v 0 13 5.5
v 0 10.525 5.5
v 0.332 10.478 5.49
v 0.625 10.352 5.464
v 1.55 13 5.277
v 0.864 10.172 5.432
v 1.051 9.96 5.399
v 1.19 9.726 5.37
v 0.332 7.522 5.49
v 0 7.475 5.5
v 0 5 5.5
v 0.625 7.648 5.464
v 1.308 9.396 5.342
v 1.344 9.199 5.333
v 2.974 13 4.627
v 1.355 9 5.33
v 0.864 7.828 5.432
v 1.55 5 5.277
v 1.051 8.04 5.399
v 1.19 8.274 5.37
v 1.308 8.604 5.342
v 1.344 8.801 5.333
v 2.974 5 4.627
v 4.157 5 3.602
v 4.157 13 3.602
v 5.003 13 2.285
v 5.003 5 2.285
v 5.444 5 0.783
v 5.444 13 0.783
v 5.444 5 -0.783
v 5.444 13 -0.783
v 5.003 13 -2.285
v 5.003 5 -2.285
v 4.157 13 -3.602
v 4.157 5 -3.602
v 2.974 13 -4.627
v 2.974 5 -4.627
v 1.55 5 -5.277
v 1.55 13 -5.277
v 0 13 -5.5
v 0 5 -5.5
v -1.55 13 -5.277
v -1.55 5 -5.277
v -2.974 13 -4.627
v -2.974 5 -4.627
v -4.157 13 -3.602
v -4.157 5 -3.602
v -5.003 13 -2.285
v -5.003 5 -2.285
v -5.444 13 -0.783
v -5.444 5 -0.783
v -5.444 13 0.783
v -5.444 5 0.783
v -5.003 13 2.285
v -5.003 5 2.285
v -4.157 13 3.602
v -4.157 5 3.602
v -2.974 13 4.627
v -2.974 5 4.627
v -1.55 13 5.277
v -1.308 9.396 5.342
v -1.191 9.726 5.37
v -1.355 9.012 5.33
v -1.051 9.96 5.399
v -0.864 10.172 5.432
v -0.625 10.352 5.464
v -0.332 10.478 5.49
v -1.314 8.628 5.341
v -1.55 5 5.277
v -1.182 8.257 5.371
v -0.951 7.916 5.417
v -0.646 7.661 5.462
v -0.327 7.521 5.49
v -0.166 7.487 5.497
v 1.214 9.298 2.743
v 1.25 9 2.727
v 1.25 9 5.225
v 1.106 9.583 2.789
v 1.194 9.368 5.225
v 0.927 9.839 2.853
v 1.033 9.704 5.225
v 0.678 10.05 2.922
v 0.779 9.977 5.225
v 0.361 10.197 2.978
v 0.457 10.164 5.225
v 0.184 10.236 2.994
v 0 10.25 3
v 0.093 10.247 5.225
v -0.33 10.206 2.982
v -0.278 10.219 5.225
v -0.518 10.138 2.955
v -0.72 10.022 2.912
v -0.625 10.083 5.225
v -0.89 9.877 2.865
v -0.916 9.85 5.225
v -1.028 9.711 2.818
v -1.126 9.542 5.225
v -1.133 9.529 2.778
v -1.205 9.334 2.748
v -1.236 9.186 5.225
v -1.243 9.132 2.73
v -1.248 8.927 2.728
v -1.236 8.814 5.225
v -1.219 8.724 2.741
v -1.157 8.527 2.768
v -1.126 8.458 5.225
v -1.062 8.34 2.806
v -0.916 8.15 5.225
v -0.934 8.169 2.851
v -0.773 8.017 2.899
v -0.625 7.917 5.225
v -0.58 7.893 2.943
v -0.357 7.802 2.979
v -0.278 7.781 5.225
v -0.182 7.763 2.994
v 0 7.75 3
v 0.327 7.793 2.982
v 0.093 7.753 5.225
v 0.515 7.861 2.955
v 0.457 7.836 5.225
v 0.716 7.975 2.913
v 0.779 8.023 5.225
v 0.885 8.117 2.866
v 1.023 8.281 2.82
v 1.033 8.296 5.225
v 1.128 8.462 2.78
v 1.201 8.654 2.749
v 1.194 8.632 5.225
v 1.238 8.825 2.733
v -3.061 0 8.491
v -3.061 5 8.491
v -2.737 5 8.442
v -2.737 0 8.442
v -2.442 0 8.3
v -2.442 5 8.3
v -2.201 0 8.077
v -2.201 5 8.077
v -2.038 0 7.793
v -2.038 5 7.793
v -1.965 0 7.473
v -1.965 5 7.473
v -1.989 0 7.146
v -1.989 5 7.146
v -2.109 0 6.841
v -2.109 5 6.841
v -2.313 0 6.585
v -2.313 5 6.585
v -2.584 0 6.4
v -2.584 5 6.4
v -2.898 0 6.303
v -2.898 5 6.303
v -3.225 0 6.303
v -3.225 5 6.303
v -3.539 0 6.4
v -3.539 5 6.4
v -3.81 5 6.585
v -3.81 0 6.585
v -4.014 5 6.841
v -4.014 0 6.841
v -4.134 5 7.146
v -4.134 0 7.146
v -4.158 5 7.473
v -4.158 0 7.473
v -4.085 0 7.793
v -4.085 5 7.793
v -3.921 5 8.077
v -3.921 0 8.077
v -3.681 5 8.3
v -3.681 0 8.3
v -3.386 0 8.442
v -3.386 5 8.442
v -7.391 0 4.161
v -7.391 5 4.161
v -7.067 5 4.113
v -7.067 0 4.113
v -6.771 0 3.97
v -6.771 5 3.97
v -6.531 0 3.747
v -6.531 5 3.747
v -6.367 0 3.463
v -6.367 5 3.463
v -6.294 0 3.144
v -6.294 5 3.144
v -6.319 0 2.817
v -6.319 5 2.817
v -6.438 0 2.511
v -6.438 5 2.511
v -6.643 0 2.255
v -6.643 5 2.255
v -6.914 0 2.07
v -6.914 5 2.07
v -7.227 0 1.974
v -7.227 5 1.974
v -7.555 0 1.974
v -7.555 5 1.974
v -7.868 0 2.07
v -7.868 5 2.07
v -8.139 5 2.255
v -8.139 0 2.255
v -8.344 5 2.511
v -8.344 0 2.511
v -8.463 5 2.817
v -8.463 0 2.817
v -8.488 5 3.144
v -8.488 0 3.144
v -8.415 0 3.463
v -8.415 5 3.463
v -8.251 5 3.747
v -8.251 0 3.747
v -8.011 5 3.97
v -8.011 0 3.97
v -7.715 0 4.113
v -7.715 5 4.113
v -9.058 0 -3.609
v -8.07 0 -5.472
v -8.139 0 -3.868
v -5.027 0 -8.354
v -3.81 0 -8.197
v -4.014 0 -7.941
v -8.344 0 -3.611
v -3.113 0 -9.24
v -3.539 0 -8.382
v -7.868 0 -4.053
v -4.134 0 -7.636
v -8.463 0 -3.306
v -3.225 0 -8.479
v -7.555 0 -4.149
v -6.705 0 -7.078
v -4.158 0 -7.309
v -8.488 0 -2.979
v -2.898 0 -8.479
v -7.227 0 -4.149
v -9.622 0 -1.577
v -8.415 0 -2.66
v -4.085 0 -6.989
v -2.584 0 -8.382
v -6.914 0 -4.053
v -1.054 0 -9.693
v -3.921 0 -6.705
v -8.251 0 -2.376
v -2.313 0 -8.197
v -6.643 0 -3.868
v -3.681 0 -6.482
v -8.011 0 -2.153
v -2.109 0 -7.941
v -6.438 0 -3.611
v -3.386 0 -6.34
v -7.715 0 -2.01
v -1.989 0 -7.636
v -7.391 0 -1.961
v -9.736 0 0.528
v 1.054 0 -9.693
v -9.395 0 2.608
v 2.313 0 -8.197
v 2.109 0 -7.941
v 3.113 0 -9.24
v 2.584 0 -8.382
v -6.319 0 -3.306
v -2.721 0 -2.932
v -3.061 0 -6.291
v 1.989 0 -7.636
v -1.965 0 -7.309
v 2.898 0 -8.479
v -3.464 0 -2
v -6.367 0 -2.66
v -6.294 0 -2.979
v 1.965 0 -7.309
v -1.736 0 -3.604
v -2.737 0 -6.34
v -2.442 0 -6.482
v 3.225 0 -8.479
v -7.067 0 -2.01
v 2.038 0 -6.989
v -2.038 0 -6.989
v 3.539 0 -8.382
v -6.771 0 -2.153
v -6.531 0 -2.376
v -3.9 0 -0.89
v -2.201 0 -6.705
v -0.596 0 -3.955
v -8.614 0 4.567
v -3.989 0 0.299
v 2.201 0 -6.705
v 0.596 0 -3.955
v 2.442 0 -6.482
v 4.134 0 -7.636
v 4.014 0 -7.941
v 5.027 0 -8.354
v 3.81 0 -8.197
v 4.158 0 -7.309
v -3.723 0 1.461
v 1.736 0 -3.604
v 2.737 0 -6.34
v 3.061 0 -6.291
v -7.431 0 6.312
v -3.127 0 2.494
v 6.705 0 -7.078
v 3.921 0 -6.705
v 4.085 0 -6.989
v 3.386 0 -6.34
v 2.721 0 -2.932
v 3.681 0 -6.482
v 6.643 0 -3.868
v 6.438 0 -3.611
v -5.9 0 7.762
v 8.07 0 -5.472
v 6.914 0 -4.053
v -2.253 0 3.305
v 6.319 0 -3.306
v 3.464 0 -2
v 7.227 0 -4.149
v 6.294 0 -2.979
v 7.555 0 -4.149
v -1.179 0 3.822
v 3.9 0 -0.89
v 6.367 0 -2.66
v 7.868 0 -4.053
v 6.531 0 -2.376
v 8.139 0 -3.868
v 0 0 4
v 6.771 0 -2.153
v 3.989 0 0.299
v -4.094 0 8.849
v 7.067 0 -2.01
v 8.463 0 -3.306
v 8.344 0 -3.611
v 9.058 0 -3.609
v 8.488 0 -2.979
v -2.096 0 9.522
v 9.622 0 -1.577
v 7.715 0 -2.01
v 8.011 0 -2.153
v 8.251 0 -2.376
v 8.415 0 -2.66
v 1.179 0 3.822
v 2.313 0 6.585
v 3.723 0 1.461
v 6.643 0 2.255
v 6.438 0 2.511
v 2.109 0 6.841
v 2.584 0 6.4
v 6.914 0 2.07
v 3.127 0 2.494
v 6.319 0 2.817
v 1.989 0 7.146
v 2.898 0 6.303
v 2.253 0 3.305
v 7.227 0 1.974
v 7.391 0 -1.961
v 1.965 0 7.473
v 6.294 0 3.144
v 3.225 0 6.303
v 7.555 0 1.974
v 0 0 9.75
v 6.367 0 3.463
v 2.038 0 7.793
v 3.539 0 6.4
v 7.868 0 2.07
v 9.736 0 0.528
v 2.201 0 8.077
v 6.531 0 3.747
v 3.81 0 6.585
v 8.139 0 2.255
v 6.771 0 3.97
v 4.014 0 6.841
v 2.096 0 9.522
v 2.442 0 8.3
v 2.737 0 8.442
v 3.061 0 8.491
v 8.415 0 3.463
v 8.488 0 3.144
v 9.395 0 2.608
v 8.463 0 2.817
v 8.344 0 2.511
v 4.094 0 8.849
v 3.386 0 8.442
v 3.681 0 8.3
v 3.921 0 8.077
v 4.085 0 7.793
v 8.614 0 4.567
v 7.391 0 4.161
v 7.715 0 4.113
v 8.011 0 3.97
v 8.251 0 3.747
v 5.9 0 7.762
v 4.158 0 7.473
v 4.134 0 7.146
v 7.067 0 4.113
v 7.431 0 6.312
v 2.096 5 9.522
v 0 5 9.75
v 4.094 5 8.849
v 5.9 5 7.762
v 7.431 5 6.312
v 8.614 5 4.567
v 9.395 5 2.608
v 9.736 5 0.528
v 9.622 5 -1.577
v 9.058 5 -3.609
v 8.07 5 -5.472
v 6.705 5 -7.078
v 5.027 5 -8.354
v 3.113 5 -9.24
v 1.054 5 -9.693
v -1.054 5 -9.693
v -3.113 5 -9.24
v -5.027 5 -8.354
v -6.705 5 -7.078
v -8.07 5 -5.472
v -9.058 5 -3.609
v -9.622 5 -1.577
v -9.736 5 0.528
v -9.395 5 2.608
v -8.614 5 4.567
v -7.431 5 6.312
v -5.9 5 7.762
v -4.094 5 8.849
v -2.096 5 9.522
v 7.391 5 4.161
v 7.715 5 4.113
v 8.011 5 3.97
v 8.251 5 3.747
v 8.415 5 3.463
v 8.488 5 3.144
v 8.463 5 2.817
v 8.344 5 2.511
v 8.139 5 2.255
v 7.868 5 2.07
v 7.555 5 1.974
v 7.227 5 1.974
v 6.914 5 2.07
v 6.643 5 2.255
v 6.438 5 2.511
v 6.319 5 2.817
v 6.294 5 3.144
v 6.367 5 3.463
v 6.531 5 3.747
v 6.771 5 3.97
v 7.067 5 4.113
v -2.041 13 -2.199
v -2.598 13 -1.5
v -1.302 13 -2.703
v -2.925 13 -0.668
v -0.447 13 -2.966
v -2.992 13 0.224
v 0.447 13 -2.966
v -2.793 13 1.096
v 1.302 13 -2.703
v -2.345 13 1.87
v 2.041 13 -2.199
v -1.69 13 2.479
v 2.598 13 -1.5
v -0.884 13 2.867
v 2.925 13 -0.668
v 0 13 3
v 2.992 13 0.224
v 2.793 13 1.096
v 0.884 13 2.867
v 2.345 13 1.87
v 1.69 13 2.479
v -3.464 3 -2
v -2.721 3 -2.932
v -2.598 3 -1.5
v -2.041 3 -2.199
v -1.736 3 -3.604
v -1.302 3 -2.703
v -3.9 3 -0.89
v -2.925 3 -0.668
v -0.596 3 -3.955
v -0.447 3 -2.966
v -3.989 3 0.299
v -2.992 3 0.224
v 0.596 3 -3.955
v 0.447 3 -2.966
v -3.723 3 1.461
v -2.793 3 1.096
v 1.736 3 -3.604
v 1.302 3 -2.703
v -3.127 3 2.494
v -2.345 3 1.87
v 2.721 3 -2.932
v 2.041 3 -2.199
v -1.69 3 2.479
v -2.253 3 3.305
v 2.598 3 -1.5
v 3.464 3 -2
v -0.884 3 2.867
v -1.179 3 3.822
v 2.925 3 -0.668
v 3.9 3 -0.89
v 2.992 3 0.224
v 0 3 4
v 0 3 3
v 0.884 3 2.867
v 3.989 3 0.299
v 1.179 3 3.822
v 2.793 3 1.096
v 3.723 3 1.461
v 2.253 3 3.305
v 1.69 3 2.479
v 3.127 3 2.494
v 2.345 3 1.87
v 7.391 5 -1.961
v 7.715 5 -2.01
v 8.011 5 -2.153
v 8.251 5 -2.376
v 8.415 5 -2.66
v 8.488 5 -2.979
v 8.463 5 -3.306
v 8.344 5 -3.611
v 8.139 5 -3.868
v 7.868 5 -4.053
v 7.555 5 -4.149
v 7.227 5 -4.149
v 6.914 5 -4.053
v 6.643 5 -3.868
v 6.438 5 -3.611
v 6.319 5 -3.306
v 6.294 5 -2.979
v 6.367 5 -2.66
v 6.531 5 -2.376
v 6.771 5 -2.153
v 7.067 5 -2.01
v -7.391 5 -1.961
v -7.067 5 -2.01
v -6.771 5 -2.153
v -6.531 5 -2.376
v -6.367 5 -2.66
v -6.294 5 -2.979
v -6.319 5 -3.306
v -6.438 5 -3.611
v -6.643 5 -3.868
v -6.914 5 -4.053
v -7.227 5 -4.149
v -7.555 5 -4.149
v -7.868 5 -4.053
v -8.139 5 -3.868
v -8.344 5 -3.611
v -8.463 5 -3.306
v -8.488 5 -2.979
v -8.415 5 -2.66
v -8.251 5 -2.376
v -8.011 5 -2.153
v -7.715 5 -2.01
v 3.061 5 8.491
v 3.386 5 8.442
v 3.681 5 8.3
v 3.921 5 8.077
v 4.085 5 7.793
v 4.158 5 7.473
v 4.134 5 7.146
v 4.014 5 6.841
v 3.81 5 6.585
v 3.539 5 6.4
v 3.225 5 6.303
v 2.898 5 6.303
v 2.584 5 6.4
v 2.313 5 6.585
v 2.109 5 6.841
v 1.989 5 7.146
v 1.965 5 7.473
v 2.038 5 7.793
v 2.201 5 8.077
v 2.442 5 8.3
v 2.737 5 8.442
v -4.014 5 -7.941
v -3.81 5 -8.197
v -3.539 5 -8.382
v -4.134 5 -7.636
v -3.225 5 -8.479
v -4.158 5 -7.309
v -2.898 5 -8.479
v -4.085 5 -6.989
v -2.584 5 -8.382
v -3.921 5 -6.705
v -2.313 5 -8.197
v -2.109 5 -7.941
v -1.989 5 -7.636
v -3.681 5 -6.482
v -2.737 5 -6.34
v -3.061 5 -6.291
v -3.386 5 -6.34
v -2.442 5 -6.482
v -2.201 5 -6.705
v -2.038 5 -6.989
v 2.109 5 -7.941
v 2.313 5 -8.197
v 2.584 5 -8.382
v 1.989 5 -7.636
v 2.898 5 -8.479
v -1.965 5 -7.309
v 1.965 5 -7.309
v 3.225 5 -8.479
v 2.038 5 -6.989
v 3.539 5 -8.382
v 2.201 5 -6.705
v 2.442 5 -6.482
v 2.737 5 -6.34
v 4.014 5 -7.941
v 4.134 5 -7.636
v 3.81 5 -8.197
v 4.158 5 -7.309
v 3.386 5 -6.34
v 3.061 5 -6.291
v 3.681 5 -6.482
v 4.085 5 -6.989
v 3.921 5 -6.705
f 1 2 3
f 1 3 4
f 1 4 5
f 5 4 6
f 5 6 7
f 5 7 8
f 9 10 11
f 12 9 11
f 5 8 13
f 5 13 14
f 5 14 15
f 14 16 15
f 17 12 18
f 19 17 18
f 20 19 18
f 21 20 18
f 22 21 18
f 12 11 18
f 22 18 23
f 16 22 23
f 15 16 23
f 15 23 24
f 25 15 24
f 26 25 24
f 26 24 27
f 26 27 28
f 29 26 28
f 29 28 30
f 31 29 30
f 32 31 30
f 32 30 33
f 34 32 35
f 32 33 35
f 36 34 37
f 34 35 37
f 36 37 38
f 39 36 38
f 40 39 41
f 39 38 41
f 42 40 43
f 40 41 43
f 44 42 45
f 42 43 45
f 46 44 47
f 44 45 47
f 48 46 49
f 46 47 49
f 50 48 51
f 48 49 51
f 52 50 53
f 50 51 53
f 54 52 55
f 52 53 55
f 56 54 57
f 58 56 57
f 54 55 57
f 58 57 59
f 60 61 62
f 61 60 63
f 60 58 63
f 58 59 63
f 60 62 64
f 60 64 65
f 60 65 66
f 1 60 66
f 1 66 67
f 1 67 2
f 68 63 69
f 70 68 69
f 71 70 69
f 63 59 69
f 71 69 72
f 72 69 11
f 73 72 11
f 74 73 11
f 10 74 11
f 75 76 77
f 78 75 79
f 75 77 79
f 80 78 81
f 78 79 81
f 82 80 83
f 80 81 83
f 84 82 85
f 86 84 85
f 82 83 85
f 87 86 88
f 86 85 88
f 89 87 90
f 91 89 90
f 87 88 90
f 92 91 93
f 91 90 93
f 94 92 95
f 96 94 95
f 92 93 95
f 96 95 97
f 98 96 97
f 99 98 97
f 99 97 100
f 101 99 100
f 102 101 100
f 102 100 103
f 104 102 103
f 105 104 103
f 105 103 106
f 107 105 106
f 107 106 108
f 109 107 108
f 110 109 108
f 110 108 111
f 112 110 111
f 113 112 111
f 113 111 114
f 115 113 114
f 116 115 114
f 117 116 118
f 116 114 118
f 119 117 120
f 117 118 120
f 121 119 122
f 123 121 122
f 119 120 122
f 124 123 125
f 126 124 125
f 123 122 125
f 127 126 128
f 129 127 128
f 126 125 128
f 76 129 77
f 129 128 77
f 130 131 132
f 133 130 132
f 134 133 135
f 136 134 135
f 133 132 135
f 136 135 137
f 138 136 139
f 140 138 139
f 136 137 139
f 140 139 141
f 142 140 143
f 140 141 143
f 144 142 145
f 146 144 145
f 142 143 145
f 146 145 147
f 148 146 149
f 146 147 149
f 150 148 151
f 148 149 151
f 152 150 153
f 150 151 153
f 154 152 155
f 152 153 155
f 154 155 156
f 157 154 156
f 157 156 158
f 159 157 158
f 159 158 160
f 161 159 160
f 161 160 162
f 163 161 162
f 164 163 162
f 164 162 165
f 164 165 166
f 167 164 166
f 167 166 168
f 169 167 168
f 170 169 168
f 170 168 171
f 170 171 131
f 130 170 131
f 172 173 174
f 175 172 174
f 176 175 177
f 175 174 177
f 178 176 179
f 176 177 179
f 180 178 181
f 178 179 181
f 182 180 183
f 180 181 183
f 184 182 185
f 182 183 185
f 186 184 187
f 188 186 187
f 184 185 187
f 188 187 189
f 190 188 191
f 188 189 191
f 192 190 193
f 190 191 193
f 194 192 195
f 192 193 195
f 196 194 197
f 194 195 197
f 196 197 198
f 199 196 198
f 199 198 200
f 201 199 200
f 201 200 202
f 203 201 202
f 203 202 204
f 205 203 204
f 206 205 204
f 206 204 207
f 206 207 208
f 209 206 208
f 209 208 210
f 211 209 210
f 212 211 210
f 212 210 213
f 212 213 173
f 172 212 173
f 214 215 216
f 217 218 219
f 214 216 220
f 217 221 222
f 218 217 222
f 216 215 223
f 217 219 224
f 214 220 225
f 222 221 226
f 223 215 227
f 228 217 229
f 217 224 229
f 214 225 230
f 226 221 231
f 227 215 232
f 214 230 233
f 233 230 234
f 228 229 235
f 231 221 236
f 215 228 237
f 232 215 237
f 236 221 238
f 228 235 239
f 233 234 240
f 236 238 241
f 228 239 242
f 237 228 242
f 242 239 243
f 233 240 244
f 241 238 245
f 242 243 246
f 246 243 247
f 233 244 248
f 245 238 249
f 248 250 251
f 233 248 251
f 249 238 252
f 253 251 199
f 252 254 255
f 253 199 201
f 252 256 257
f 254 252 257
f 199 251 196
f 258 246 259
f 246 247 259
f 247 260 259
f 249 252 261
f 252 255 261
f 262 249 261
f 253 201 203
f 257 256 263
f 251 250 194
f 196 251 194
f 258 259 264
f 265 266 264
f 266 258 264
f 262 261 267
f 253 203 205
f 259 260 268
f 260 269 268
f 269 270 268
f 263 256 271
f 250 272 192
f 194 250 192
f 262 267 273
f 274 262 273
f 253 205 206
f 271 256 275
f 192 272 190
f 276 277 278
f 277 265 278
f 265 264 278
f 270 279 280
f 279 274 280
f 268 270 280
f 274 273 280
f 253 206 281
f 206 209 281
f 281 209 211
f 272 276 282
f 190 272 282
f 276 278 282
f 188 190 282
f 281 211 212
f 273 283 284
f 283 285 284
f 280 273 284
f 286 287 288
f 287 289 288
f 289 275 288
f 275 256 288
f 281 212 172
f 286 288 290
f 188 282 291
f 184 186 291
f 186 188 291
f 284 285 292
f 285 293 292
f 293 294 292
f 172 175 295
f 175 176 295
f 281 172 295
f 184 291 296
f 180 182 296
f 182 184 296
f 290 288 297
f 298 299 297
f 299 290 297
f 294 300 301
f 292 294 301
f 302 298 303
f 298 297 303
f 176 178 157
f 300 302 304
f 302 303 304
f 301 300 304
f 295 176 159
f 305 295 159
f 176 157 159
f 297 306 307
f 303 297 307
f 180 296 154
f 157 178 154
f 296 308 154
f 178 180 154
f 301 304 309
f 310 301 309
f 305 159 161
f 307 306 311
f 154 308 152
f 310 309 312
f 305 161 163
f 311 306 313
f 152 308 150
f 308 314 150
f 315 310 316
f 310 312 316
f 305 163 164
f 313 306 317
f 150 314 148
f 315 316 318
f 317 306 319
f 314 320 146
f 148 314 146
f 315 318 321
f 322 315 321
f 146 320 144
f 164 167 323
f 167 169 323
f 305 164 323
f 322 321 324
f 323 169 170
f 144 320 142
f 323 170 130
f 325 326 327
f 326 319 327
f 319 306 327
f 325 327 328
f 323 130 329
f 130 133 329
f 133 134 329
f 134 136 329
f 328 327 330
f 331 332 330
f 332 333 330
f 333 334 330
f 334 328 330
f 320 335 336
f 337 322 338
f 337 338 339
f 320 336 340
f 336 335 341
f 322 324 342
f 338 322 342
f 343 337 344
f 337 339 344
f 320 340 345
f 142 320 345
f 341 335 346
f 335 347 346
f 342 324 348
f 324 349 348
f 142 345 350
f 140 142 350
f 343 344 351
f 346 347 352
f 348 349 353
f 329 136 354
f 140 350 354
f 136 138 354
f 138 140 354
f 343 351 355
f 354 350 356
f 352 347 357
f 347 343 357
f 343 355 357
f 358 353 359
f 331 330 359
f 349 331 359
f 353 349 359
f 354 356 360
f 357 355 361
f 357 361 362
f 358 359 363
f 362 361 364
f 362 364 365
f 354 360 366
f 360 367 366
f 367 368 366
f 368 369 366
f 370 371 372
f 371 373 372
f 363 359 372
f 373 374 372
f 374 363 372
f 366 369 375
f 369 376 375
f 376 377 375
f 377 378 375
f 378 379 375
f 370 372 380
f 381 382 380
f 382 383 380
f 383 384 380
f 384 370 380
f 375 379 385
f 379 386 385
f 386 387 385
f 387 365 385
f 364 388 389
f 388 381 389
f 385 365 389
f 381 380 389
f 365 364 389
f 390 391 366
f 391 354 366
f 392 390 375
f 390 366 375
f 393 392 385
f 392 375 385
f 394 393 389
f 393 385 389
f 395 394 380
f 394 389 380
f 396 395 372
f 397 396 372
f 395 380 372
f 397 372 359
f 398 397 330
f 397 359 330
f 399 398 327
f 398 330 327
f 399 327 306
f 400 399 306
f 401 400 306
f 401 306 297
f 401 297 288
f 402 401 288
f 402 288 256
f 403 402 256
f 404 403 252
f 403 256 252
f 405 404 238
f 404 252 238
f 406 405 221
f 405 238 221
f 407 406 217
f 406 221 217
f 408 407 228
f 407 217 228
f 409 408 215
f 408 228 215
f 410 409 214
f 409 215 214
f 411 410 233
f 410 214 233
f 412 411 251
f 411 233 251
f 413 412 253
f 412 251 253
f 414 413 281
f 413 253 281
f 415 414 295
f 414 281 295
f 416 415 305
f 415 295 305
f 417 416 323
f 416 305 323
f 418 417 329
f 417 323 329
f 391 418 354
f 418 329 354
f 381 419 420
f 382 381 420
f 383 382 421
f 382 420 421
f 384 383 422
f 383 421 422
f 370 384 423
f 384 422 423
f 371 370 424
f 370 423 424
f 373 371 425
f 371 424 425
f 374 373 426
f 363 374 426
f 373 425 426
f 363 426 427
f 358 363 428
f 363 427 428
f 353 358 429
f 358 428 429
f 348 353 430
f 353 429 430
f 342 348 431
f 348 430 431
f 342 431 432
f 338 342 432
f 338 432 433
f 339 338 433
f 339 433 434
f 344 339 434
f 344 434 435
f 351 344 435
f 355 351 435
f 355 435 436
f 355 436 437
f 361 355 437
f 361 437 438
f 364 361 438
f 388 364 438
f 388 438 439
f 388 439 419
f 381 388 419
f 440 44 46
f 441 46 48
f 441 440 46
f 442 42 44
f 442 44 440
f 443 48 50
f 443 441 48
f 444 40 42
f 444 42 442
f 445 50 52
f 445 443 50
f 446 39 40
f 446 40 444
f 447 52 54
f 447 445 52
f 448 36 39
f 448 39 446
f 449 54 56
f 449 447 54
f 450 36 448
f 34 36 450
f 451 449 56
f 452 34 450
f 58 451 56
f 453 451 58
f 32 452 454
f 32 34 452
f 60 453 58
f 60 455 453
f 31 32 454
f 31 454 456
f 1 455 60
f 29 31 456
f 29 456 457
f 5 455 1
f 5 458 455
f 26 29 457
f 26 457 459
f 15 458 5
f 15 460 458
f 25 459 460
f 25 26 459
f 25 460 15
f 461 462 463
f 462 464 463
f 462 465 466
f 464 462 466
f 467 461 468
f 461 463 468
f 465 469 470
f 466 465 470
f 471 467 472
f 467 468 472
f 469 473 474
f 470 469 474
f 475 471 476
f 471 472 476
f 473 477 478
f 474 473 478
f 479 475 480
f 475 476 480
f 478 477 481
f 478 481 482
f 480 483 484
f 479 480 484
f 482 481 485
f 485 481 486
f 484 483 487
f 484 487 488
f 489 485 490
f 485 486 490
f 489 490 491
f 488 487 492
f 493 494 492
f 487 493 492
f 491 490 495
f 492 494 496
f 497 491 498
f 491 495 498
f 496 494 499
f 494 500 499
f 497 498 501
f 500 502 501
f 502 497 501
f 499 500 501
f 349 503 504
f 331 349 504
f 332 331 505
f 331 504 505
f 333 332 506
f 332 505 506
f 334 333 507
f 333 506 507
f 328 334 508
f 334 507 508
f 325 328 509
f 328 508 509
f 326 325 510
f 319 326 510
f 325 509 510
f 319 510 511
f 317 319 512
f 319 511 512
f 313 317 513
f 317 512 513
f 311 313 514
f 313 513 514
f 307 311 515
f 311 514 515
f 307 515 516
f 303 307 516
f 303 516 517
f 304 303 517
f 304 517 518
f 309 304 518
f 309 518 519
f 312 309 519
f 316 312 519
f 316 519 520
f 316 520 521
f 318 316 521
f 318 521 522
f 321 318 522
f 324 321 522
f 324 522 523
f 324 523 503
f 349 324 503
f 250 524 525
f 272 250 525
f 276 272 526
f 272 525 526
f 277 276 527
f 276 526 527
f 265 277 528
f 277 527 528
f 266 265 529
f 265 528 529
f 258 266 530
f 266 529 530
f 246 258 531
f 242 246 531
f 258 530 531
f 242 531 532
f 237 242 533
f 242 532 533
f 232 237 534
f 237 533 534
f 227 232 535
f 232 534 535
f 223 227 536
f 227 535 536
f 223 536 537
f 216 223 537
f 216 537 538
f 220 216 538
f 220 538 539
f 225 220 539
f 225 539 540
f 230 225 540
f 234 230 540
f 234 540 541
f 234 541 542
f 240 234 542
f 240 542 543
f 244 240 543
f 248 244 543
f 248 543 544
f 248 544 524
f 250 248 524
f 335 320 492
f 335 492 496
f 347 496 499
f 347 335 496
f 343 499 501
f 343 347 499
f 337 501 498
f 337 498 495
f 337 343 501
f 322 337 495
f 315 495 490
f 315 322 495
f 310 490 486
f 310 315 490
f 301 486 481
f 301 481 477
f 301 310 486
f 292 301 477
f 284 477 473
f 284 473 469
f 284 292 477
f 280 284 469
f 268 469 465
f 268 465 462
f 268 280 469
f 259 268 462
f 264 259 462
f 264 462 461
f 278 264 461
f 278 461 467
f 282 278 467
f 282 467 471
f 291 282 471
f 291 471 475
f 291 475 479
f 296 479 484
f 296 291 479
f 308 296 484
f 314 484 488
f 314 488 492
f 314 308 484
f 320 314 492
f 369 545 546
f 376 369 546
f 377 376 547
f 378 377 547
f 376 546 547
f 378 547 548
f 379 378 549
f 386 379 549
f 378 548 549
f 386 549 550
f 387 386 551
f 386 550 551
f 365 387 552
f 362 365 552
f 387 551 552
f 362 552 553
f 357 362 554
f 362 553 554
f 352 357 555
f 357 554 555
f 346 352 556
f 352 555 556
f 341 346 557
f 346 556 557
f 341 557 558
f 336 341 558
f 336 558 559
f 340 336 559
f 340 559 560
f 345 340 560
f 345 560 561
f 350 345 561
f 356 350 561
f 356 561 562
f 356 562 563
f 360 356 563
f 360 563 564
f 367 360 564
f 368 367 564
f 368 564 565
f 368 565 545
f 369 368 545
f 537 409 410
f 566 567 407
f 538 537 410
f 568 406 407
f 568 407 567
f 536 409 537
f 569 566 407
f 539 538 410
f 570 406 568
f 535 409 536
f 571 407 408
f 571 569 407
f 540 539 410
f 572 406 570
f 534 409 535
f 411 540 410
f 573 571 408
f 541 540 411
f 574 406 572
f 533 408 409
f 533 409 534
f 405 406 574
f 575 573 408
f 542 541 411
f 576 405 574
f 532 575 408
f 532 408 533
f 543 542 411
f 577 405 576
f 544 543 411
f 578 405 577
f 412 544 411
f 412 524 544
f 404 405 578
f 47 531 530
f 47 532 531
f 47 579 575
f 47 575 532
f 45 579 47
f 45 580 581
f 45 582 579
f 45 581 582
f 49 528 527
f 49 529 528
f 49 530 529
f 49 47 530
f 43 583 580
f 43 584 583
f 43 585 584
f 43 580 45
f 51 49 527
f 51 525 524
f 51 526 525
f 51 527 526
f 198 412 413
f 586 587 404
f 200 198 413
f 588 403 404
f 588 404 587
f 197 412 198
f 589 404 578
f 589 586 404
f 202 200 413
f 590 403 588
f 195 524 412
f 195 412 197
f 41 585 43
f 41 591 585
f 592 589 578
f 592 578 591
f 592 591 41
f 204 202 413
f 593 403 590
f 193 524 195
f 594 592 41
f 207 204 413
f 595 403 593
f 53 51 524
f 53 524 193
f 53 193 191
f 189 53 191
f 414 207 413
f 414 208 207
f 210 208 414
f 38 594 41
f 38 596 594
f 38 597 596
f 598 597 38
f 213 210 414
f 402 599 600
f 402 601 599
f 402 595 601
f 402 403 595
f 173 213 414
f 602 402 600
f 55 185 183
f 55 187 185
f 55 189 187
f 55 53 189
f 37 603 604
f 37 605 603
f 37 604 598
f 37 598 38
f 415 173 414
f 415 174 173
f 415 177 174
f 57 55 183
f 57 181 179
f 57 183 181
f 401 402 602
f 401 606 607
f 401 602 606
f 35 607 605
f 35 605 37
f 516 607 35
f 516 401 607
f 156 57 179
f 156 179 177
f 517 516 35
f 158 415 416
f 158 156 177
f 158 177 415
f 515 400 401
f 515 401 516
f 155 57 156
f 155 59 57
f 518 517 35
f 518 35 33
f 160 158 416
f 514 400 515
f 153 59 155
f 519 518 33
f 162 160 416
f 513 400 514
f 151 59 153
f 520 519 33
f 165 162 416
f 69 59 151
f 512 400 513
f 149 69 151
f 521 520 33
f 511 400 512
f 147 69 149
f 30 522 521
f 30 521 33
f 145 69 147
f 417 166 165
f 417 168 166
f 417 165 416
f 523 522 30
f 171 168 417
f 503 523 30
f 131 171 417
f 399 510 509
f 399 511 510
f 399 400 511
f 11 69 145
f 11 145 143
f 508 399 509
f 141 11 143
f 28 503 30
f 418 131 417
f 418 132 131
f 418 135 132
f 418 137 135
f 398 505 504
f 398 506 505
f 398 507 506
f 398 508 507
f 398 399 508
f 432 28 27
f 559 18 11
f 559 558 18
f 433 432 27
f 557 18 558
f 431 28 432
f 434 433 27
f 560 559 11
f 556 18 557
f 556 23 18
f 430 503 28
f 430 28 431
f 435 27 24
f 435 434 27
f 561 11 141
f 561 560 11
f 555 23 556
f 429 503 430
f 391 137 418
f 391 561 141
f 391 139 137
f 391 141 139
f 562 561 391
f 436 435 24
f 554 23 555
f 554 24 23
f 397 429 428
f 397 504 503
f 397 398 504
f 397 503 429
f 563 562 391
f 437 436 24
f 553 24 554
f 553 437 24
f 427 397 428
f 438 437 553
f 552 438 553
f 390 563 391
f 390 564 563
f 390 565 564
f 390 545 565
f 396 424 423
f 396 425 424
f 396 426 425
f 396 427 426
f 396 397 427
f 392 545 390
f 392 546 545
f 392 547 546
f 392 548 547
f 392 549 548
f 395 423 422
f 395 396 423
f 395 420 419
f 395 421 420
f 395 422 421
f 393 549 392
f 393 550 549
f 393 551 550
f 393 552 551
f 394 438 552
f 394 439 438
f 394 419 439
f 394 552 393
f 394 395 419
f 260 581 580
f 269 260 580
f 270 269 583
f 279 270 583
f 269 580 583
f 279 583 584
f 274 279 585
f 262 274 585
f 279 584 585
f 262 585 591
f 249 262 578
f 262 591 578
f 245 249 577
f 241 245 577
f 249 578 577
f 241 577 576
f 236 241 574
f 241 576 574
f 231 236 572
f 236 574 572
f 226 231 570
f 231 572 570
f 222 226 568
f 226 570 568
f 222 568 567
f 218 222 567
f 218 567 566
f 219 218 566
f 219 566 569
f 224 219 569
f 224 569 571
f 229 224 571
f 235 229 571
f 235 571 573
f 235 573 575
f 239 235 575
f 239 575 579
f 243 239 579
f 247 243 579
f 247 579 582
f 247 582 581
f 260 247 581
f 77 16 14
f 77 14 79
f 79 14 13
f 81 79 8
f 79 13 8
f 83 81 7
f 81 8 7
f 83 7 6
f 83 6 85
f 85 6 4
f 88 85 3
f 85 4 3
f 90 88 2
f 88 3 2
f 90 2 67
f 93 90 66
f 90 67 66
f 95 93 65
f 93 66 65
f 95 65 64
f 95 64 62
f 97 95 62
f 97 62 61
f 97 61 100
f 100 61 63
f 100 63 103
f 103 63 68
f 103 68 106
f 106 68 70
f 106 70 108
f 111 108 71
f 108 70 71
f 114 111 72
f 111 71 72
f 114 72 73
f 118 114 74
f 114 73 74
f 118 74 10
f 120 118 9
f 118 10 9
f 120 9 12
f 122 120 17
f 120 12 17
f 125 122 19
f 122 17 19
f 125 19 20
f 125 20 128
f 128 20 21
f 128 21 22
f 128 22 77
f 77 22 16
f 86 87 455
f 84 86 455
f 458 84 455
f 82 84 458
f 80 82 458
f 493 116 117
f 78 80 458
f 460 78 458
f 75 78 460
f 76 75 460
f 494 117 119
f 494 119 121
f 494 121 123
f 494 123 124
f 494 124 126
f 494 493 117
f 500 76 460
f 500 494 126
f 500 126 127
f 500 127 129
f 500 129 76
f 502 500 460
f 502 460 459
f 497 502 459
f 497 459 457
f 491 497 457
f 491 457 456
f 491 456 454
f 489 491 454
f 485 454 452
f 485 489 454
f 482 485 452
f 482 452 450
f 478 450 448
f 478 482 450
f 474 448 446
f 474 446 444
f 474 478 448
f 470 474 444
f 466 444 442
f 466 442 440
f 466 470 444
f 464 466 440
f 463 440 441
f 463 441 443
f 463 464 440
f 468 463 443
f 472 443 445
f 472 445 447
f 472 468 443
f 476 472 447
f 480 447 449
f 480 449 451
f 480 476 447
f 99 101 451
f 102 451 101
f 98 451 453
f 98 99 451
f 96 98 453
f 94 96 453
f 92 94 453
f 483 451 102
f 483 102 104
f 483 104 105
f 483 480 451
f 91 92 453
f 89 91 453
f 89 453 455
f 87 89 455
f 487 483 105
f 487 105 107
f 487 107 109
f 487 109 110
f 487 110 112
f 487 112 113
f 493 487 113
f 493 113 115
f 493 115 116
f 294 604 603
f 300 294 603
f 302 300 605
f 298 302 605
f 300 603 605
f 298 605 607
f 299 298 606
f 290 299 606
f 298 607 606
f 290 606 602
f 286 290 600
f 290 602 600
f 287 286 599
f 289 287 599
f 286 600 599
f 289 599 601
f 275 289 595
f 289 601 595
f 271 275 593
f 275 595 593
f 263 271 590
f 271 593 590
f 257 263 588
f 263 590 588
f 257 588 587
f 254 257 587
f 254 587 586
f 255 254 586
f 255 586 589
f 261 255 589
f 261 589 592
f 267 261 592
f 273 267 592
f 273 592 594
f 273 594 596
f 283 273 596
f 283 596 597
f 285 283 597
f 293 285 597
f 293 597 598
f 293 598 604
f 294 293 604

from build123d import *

# Parameters (mm, degrees)
SKETCH2_R           = 9.75
SKETCH2_R_2         = 4
BOSS_EXTRUDE1_DEPTH = 3
SKETCH3_R           = 5.5
SKETCH3_R_2         = 3
BOSS_EXTRUDE2_DEPTH = 10
SKETCH16_R          = 9.75
SKETCH16_R_2        = 5.5
BOSS_EXTRUDE3_DEPTH = 2
SKETCH5_R           = 1.1
CUT_EXTRUDE1_DEPTH  = 16.941298617


# Read off the part's stored shape, not the designer's step: M3x0.5 Tapped Hole1
with BuildPart() as part:
    # Sketch2 → Boss-Extrude1 (new body)
    with BuildSketch(Plane(origin=(0, 0, 0), x_dir=(1, 0, 0), z_dir=(0, 1, 0))):
        with Locations(Location((0, 0, 0), (0, 0, 270))):
            Circle(SKETCH2_R)
        with Locations(Location((0, 0, 0), (0, 0, 270))):
            Circle(SKETCH2_R_2, mode=Mode.SUBTRACT)
    extrude(amount=BOSS_EXTRUDE1_DEPTH)

    # Sketch3 → Boss-Extrude2 (add)
    with BuildSketch(Plane(origin=(0, 3, 0), x_dir=(1, 0, 0), z_dir=(0, 1, 0))):
        with Locations(Location((0, 0, 0), (0, 0, 270))):
            Circle(SKETCH3_R)
        with Locations(Location((0, 0, 0), (0, 0, 270))):
            Circle(SKETCH3_R_2, mode=Mode.SUBTRACT)
    extrude(amount=BOSS_EXTRUDE2_DEPTH)

    # Sketch16 → Boss-Extrude3 (add)
    with BuildSketch(Plane(origin=(0, 3, 0), x_dir=(1, 0, 0), z_dir=(0, 1, 0))):
        with Locations(Location((0, 0, 0), (0, 0, 270))):
            Circle(SKETCH16_R)
        with Locations(Location((0, 0, 0), (0, 0, 270))):
            Circle(SKETCH16_R_2, mode=Mode.SUBTRACT)
    extrude(amount=BOSS_EXTRUDE3_DEPTH)

    # M3x0.5 Tapped Hole1 outline → M3x0.5 Tapped Hole1 (revolve, cut)
    with BuildSketch(Plane.XZ.offset(-9)):
        Polygon((1.525000456, 5.500000456), (0, 5.500000456), (0, 2.727054604), (1.25, 2.727054604), (1.25, 5.225), align=None)
    revolve(axis=Axis((0, 9, 0), (0, 0, 1)), mode=Mode.SUBTRACT)

    # Sketch5 → Cut-Extrude1 (cut, through all)
    with BuildSketch(Plane(origin=(0, 5, 0), x_dir=(1, 0, 0), z_dir=(0, 1, 0))):
        with Locations(Location((3.061467459, 7.39103626, 0), (0, 0, 270))):
            Circle(SKETCH5_R)
        with Locations(Location((7.39103626, 3.061467459, 0), (0, 0, 270))):
            Circle(SKETCH5_R)
        with Locations(Location((7.39103626, -3.061467459, 0), (0, 0, 270))):
            Circle(SKETCH5_R)
        with Locations(Location((3.061467459, -7.39103626, 0), (0, 0, 270))):
            Circle(SKETCH5_R)
        with Locations(Location((-3.061467459, -7.39103626, 0), (0, 0, 270))):
            Circle(SKETCH5_R)
        with Locations(Location((-7.39103626, -3.061467459, 0), (0, 0, 270))):
            Circle(SKETCH5_R)
        with Locations(Location((-7.39103626, 3.061467459, 0), (0, 0, 270))):
            Circle(SKETCH5_R)
        with Locations(Location((-3.061467459, 7.39103626, 0), (0, 0, 270))):
            Circle(SKETCH5_R)
    extrude(amount=-CUT_EXTRUDE1_DEPTH, mode=Mode.SUBTRACT)


solid = part.part
